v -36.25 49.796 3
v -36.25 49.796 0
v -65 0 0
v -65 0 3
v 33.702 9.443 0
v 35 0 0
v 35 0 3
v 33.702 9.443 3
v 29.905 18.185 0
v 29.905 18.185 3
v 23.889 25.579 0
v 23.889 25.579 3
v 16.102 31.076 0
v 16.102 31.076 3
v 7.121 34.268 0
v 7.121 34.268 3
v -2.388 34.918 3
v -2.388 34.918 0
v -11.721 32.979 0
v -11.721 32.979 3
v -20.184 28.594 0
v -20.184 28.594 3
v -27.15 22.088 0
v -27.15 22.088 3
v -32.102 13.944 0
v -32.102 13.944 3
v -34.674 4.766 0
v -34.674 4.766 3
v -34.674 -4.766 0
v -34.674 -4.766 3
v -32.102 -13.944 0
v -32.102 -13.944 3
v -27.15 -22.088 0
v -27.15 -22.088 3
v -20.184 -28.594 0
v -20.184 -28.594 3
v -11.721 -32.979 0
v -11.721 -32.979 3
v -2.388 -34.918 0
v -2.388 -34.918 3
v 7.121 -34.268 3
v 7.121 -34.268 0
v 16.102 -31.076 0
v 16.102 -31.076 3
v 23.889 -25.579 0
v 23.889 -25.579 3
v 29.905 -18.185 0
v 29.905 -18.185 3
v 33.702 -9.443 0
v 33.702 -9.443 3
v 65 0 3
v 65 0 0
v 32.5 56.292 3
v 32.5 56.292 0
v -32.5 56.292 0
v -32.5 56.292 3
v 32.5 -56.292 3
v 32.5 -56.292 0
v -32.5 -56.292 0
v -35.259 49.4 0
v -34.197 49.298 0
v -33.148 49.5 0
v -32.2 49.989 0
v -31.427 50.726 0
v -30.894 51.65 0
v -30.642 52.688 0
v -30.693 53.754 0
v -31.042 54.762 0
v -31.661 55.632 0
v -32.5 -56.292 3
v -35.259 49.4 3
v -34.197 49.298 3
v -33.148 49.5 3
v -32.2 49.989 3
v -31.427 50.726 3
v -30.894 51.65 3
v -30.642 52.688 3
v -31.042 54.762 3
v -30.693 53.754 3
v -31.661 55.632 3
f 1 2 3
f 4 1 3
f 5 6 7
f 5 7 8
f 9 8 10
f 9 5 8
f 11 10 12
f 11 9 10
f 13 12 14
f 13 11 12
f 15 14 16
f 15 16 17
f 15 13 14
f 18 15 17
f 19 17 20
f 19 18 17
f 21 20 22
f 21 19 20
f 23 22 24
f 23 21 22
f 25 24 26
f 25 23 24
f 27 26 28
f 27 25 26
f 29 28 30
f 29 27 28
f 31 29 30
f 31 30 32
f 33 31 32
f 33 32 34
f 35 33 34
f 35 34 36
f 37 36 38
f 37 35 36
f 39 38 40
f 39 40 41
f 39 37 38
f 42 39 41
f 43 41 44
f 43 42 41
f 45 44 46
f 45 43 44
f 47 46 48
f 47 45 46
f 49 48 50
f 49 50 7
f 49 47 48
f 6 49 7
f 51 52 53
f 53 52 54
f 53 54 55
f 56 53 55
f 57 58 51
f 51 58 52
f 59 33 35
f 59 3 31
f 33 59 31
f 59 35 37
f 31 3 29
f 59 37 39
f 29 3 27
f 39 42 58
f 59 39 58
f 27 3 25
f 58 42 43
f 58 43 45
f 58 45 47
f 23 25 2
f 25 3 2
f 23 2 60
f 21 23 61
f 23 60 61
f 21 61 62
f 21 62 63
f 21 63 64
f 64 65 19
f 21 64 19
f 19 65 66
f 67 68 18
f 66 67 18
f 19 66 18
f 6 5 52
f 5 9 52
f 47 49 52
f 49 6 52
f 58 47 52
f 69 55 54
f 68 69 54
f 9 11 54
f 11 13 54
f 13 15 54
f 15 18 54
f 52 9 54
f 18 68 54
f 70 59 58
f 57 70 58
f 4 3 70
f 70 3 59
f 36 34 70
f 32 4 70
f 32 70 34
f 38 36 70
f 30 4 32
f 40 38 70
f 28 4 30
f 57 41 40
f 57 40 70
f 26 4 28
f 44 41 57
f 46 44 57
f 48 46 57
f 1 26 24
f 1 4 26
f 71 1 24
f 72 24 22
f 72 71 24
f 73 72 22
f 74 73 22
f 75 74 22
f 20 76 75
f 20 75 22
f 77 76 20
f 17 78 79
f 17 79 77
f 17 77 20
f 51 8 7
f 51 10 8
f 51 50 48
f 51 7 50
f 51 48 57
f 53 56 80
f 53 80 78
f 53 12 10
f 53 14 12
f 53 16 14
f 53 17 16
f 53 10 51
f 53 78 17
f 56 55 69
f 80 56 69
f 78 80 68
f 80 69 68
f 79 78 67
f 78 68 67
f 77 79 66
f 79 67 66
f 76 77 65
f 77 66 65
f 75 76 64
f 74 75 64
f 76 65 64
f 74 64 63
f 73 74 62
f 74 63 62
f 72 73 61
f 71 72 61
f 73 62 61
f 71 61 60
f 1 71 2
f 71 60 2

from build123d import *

# Parameters (mm, degrees)
CROQUIS2_R              = 35
SALIENTE_EXTRUIR1_DEPTH = 3


with BuildPart() as part:
    # Croquis2 → Saliente-Extruir1 (new body)
    with BuildSketch(Plane.XY):
        with BuildLine():
            Line((-65, 0), (-32.5, -56.291651246))
            Line((-32.5, -56.291651246), (32.5, -56.291651246))
            Line((32.5, -56.291651246), (65, 0))
            Line((65, 0), (32.5, 56.291651246))
            Line((32.5, 56.291651246), (-32.5, 56.291651246))
            ThreePointArc((-32.5, 56.291651246), (-31.127404736, 51.169055982), (-36.25, 49.796460718))
            Line((-36.25, 49.796460718), (-65, 0))
        make_face()
        Circle(CROQUIS2_R, mode=Mode.SUBTRACT)
    extrude(amount=SALIENTE_EXTRUIR1_DEPTH)


solid = part.part
